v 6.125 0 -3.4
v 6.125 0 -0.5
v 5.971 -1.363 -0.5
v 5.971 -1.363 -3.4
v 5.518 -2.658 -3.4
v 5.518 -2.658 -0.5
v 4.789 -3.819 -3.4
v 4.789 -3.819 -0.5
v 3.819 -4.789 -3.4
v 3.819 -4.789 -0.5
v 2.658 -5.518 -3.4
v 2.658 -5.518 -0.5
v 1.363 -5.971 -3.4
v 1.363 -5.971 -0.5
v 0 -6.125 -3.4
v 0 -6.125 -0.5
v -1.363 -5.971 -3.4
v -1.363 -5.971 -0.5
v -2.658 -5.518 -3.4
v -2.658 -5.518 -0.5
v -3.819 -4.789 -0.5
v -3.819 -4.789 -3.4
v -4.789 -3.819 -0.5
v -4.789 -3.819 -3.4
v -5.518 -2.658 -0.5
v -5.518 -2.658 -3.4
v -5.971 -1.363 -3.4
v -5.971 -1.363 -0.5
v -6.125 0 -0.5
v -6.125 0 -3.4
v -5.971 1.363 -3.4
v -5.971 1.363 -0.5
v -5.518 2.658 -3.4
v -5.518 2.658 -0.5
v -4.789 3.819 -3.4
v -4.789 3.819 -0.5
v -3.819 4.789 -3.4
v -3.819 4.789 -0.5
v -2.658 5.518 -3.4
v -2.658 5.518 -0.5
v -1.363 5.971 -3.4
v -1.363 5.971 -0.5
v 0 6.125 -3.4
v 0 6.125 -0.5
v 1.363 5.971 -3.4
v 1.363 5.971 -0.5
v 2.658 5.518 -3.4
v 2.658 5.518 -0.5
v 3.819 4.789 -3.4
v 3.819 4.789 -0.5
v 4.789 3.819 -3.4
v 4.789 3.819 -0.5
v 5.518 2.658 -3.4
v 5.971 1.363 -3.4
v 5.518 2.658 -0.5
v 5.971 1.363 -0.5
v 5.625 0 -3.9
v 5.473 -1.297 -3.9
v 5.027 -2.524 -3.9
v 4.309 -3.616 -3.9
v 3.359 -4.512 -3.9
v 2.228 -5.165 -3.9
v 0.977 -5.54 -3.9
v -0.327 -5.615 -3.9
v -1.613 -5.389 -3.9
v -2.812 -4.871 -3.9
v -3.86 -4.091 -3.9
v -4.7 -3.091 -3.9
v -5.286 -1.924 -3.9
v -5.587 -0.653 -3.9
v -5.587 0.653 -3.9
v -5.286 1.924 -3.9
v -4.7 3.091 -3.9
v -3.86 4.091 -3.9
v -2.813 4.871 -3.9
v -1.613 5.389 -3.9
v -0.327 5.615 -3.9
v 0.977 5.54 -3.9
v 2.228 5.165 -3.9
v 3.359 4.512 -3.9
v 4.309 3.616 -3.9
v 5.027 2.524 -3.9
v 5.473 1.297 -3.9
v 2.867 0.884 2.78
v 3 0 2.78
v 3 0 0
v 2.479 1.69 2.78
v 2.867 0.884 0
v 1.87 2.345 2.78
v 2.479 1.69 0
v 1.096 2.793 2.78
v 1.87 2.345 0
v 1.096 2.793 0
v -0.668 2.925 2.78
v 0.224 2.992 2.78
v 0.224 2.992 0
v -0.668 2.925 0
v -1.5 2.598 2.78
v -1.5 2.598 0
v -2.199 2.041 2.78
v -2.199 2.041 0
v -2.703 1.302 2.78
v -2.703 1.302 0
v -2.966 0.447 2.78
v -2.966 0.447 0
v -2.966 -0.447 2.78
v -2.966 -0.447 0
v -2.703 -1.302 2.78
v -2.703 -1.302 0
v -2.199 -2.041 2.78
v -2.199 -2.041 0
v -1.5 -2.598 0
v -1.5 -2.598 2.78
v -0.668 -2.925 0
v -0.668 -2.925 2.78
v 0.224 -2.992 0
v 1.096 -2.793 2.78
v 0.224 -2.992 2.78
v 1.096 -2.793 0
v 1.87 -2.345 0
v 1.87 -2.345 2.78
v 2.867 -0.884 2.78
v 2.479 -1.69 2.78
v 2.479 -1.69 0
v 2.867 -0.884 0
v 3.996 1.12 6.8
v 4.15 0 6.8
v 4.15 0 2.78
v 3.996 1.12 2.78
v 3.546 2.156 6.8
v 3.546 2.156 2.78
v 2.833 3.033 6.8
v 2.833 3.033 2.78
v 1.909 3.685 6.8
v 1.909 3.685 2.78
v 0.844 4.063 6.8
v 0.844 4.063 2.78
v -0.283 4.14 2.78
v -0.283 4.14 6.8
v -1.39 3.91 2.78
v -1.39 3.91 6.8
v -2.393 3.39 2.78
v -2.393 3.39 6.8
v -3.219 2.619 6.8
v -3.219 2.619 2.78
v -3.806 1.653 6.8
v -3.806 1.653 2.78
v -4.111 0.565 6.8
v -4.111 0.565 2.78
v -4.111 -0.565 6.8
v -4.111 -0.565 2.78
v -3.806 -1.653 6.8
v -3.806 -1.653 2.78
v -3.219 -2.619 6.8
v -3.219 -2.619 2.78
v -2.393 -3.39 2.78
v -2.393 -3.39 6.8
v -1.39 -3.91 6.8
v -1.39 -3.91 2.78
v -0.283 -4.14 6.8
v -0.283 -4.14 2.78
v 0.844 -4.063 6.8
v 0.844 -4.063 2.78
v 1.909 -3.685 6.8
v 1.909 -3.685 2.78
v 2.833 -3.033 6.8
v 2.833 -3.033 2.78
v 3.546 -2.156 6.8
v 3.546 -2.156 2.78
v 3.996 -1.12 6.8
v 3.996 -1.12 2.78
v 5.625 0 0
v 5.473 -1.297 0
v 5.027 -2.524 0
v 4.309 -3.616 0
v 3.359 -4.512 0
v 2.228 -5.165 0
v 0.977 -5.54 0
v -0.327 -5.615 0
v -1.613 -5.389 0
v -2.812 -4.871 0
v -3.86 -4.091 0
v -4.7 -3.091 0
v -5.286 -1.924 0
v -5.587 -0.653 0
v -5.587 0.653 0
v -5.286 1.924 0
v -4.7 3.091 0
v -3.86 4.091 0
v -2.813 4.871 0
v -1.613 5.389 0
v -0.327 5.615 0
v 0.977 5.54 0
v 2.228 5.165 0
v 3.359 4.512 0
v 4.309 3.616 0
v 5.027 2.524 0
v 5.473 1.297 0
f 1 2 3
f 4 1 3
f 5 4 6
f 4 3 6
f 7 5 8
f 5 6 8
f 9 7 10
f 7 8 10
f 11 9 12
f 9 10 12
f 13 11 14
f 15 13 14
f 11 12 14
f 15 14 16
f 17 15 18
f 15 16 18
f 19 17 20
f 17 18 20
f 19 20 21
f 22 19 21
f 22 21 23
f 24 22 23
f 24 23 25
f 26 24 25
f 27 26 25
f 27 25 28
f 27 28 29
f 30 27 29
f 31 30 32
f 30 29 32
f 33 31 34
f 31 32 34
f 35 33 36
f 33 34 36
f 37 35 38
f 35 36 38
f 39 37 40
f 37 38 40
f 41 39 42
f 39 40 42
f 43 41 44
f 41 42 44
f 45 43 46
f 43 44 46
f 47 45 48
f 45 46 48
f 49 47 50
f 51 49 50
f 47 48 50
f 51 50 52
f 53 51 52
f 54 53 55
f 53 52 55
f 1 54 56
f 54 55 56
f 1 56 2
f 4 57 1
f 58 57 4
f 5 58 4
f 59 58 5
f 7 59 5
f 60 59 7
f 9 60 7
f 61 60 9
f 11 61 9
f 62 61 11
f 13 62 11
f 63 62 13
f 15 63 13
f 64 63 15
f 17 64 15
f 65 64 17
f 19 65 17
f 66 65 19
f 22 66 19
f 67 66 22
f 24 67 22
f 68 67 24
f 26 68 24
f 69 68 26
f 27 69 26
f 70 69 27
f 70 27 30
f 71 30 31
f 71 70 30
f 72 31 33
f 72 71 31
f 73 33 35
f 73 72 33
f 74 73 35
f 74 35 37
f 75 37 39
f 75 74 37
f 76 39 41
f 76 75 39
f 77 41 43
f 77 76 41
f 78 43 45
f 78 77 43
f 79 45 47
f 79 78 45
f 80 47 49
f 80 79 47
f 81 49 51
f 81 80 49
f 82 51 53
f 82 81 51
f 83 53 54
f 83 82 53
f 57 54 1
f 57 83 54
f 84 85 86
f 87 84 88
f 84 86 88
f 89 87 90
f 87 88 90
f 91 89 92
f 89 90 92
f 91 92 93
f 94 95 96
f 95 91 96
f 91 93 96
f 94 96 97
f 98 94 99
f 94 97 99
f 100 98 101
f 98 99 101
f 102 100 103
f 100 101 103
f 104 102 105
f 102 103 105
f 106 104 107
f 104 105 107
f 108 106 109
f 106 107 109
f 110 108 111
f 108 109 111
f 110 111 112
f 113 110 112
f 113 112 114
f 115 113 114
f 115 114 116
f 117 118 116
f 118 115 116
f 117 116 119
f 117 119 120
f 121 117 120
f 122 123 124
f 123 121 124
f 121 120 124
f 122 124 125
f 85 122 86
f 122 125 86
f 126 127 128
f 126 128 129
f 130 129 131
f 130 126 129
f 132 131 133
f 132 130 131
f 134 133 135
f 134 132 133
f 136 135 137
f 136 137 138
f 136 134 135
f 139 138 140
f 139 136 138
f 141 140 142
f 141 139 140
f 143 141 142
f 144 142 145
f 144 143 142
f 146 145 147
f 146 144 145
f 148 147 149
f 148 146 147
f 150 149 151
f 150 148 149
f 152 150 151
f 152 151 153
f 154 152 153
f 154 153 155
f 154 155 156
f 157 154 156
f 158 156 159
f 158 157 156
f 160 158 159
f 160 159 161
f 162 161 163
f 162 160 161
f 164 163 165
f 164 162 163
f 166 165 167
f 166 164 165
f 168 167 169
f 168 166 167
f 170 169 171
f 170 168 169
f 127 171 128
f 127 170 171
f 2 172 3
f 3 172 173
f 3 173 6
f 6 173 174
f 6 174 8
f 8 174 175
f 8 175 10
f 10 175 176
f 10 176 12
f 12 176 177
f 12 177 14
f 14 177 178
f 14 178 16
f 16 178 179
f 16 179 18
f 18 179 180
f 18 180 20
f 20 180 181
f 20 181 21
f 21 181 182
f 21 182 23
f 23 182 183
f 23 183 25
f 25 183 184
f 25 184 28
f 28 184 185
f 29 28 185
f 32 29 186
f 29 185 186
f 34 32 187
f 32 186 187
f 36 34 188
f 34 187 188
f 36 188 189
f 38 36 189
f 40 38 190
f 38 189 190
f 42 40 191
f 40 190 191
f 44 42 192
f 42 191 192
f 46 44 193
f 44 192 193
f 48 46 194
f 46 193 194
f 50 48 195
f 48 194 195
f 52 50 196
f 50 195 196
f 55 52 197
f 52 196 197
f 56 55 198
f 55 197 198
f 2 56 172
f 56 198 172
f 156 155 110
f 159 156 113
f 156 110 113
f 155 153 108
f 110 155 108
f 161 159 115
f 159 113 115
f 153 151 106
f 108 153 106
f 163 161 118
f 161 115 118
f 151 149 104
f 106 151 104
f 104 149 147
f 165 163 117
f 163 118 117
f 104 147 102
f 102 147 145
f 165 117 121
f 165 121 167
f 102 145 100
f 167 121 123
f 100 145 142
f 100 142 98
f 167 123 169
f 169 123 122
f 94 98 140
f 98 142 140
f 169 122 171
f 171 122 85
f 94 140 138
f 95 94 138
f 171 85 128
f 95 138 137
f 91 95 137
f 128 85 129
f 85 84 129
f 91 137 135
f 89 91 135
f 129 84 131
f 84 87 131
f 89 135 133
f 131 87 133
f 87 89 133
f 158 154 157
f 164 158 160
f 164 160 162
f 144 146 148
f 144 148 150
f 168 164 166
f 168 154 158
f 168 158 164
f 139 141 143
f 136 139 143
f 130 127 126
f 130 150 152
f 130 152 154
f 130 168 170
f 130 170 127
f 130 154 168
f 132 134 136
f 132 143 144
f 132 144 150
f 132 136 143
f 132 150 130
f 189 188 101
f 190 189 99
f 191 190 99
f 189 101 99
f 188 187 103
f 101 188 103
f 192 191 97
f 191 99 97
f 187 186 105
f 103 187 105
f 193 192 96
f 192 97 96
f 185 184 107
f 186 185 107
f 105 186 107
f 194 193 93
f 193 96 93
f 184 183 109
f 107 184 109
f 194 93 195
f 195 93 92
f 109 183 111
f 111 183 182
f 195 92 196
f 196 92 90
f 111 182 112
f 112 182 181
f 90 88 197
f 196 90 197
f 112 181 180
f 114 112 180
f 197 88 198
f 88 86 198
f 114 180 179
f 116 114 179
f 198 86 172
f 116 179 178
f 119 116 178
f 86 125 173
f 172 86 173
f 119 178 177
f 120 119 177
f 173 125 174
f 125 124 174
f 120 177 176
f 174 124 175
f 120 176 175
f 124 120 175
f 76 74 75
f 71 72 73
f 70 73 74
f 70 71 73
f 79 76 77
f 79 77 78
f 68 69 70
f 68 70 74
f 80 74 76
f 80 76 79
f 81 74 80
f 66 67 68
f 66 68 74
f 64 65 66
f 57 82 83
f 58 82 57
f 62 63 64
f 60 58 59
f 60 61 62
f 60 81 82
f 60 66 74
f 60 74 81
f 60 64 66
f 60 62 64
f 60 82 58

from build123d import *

# Parameters (mm, degrees)
F0_R     = 3
F1_DEPTH = 6.8
F2_R     = 6.125
F3_DEPTH = 3.9
F4_SIZE  = 0.5
F5_R     = 4.15
F6_DEPTH = 4.02


with BuildPart() as f1:
    # F0 (on Top) → F1 (new body)
    with BuildSketch(Plane.XY):
        Circle(F0_R)
    extrude(amount=F1_DEPTH)

    # F2 (on face) → F3 (join)
    with BuildSketch(Plane(origin=(0, 0, 0), x_dir=(1, 0, 0), z_dir=(0, 0, -1))):
        Circle(F2_R)
    extrude(amount=F3_DEPTH)

    # F4
    f4_edges = [f1.edges().sort_by_distance(p)[0] for p in [
        (-6.125, 0, 0),
        (-6.125, 0, -3.9),
    ]]
    chamfer(f4_edges, length=F4_SIZE)

    # F5 (on face) → F6 (join)
    with BuildSketch(Plane.XY.offset(6.8)):
        Circle(F5_R)
    extrude(amount=-F6_DEPTH)


solid = f1.part
